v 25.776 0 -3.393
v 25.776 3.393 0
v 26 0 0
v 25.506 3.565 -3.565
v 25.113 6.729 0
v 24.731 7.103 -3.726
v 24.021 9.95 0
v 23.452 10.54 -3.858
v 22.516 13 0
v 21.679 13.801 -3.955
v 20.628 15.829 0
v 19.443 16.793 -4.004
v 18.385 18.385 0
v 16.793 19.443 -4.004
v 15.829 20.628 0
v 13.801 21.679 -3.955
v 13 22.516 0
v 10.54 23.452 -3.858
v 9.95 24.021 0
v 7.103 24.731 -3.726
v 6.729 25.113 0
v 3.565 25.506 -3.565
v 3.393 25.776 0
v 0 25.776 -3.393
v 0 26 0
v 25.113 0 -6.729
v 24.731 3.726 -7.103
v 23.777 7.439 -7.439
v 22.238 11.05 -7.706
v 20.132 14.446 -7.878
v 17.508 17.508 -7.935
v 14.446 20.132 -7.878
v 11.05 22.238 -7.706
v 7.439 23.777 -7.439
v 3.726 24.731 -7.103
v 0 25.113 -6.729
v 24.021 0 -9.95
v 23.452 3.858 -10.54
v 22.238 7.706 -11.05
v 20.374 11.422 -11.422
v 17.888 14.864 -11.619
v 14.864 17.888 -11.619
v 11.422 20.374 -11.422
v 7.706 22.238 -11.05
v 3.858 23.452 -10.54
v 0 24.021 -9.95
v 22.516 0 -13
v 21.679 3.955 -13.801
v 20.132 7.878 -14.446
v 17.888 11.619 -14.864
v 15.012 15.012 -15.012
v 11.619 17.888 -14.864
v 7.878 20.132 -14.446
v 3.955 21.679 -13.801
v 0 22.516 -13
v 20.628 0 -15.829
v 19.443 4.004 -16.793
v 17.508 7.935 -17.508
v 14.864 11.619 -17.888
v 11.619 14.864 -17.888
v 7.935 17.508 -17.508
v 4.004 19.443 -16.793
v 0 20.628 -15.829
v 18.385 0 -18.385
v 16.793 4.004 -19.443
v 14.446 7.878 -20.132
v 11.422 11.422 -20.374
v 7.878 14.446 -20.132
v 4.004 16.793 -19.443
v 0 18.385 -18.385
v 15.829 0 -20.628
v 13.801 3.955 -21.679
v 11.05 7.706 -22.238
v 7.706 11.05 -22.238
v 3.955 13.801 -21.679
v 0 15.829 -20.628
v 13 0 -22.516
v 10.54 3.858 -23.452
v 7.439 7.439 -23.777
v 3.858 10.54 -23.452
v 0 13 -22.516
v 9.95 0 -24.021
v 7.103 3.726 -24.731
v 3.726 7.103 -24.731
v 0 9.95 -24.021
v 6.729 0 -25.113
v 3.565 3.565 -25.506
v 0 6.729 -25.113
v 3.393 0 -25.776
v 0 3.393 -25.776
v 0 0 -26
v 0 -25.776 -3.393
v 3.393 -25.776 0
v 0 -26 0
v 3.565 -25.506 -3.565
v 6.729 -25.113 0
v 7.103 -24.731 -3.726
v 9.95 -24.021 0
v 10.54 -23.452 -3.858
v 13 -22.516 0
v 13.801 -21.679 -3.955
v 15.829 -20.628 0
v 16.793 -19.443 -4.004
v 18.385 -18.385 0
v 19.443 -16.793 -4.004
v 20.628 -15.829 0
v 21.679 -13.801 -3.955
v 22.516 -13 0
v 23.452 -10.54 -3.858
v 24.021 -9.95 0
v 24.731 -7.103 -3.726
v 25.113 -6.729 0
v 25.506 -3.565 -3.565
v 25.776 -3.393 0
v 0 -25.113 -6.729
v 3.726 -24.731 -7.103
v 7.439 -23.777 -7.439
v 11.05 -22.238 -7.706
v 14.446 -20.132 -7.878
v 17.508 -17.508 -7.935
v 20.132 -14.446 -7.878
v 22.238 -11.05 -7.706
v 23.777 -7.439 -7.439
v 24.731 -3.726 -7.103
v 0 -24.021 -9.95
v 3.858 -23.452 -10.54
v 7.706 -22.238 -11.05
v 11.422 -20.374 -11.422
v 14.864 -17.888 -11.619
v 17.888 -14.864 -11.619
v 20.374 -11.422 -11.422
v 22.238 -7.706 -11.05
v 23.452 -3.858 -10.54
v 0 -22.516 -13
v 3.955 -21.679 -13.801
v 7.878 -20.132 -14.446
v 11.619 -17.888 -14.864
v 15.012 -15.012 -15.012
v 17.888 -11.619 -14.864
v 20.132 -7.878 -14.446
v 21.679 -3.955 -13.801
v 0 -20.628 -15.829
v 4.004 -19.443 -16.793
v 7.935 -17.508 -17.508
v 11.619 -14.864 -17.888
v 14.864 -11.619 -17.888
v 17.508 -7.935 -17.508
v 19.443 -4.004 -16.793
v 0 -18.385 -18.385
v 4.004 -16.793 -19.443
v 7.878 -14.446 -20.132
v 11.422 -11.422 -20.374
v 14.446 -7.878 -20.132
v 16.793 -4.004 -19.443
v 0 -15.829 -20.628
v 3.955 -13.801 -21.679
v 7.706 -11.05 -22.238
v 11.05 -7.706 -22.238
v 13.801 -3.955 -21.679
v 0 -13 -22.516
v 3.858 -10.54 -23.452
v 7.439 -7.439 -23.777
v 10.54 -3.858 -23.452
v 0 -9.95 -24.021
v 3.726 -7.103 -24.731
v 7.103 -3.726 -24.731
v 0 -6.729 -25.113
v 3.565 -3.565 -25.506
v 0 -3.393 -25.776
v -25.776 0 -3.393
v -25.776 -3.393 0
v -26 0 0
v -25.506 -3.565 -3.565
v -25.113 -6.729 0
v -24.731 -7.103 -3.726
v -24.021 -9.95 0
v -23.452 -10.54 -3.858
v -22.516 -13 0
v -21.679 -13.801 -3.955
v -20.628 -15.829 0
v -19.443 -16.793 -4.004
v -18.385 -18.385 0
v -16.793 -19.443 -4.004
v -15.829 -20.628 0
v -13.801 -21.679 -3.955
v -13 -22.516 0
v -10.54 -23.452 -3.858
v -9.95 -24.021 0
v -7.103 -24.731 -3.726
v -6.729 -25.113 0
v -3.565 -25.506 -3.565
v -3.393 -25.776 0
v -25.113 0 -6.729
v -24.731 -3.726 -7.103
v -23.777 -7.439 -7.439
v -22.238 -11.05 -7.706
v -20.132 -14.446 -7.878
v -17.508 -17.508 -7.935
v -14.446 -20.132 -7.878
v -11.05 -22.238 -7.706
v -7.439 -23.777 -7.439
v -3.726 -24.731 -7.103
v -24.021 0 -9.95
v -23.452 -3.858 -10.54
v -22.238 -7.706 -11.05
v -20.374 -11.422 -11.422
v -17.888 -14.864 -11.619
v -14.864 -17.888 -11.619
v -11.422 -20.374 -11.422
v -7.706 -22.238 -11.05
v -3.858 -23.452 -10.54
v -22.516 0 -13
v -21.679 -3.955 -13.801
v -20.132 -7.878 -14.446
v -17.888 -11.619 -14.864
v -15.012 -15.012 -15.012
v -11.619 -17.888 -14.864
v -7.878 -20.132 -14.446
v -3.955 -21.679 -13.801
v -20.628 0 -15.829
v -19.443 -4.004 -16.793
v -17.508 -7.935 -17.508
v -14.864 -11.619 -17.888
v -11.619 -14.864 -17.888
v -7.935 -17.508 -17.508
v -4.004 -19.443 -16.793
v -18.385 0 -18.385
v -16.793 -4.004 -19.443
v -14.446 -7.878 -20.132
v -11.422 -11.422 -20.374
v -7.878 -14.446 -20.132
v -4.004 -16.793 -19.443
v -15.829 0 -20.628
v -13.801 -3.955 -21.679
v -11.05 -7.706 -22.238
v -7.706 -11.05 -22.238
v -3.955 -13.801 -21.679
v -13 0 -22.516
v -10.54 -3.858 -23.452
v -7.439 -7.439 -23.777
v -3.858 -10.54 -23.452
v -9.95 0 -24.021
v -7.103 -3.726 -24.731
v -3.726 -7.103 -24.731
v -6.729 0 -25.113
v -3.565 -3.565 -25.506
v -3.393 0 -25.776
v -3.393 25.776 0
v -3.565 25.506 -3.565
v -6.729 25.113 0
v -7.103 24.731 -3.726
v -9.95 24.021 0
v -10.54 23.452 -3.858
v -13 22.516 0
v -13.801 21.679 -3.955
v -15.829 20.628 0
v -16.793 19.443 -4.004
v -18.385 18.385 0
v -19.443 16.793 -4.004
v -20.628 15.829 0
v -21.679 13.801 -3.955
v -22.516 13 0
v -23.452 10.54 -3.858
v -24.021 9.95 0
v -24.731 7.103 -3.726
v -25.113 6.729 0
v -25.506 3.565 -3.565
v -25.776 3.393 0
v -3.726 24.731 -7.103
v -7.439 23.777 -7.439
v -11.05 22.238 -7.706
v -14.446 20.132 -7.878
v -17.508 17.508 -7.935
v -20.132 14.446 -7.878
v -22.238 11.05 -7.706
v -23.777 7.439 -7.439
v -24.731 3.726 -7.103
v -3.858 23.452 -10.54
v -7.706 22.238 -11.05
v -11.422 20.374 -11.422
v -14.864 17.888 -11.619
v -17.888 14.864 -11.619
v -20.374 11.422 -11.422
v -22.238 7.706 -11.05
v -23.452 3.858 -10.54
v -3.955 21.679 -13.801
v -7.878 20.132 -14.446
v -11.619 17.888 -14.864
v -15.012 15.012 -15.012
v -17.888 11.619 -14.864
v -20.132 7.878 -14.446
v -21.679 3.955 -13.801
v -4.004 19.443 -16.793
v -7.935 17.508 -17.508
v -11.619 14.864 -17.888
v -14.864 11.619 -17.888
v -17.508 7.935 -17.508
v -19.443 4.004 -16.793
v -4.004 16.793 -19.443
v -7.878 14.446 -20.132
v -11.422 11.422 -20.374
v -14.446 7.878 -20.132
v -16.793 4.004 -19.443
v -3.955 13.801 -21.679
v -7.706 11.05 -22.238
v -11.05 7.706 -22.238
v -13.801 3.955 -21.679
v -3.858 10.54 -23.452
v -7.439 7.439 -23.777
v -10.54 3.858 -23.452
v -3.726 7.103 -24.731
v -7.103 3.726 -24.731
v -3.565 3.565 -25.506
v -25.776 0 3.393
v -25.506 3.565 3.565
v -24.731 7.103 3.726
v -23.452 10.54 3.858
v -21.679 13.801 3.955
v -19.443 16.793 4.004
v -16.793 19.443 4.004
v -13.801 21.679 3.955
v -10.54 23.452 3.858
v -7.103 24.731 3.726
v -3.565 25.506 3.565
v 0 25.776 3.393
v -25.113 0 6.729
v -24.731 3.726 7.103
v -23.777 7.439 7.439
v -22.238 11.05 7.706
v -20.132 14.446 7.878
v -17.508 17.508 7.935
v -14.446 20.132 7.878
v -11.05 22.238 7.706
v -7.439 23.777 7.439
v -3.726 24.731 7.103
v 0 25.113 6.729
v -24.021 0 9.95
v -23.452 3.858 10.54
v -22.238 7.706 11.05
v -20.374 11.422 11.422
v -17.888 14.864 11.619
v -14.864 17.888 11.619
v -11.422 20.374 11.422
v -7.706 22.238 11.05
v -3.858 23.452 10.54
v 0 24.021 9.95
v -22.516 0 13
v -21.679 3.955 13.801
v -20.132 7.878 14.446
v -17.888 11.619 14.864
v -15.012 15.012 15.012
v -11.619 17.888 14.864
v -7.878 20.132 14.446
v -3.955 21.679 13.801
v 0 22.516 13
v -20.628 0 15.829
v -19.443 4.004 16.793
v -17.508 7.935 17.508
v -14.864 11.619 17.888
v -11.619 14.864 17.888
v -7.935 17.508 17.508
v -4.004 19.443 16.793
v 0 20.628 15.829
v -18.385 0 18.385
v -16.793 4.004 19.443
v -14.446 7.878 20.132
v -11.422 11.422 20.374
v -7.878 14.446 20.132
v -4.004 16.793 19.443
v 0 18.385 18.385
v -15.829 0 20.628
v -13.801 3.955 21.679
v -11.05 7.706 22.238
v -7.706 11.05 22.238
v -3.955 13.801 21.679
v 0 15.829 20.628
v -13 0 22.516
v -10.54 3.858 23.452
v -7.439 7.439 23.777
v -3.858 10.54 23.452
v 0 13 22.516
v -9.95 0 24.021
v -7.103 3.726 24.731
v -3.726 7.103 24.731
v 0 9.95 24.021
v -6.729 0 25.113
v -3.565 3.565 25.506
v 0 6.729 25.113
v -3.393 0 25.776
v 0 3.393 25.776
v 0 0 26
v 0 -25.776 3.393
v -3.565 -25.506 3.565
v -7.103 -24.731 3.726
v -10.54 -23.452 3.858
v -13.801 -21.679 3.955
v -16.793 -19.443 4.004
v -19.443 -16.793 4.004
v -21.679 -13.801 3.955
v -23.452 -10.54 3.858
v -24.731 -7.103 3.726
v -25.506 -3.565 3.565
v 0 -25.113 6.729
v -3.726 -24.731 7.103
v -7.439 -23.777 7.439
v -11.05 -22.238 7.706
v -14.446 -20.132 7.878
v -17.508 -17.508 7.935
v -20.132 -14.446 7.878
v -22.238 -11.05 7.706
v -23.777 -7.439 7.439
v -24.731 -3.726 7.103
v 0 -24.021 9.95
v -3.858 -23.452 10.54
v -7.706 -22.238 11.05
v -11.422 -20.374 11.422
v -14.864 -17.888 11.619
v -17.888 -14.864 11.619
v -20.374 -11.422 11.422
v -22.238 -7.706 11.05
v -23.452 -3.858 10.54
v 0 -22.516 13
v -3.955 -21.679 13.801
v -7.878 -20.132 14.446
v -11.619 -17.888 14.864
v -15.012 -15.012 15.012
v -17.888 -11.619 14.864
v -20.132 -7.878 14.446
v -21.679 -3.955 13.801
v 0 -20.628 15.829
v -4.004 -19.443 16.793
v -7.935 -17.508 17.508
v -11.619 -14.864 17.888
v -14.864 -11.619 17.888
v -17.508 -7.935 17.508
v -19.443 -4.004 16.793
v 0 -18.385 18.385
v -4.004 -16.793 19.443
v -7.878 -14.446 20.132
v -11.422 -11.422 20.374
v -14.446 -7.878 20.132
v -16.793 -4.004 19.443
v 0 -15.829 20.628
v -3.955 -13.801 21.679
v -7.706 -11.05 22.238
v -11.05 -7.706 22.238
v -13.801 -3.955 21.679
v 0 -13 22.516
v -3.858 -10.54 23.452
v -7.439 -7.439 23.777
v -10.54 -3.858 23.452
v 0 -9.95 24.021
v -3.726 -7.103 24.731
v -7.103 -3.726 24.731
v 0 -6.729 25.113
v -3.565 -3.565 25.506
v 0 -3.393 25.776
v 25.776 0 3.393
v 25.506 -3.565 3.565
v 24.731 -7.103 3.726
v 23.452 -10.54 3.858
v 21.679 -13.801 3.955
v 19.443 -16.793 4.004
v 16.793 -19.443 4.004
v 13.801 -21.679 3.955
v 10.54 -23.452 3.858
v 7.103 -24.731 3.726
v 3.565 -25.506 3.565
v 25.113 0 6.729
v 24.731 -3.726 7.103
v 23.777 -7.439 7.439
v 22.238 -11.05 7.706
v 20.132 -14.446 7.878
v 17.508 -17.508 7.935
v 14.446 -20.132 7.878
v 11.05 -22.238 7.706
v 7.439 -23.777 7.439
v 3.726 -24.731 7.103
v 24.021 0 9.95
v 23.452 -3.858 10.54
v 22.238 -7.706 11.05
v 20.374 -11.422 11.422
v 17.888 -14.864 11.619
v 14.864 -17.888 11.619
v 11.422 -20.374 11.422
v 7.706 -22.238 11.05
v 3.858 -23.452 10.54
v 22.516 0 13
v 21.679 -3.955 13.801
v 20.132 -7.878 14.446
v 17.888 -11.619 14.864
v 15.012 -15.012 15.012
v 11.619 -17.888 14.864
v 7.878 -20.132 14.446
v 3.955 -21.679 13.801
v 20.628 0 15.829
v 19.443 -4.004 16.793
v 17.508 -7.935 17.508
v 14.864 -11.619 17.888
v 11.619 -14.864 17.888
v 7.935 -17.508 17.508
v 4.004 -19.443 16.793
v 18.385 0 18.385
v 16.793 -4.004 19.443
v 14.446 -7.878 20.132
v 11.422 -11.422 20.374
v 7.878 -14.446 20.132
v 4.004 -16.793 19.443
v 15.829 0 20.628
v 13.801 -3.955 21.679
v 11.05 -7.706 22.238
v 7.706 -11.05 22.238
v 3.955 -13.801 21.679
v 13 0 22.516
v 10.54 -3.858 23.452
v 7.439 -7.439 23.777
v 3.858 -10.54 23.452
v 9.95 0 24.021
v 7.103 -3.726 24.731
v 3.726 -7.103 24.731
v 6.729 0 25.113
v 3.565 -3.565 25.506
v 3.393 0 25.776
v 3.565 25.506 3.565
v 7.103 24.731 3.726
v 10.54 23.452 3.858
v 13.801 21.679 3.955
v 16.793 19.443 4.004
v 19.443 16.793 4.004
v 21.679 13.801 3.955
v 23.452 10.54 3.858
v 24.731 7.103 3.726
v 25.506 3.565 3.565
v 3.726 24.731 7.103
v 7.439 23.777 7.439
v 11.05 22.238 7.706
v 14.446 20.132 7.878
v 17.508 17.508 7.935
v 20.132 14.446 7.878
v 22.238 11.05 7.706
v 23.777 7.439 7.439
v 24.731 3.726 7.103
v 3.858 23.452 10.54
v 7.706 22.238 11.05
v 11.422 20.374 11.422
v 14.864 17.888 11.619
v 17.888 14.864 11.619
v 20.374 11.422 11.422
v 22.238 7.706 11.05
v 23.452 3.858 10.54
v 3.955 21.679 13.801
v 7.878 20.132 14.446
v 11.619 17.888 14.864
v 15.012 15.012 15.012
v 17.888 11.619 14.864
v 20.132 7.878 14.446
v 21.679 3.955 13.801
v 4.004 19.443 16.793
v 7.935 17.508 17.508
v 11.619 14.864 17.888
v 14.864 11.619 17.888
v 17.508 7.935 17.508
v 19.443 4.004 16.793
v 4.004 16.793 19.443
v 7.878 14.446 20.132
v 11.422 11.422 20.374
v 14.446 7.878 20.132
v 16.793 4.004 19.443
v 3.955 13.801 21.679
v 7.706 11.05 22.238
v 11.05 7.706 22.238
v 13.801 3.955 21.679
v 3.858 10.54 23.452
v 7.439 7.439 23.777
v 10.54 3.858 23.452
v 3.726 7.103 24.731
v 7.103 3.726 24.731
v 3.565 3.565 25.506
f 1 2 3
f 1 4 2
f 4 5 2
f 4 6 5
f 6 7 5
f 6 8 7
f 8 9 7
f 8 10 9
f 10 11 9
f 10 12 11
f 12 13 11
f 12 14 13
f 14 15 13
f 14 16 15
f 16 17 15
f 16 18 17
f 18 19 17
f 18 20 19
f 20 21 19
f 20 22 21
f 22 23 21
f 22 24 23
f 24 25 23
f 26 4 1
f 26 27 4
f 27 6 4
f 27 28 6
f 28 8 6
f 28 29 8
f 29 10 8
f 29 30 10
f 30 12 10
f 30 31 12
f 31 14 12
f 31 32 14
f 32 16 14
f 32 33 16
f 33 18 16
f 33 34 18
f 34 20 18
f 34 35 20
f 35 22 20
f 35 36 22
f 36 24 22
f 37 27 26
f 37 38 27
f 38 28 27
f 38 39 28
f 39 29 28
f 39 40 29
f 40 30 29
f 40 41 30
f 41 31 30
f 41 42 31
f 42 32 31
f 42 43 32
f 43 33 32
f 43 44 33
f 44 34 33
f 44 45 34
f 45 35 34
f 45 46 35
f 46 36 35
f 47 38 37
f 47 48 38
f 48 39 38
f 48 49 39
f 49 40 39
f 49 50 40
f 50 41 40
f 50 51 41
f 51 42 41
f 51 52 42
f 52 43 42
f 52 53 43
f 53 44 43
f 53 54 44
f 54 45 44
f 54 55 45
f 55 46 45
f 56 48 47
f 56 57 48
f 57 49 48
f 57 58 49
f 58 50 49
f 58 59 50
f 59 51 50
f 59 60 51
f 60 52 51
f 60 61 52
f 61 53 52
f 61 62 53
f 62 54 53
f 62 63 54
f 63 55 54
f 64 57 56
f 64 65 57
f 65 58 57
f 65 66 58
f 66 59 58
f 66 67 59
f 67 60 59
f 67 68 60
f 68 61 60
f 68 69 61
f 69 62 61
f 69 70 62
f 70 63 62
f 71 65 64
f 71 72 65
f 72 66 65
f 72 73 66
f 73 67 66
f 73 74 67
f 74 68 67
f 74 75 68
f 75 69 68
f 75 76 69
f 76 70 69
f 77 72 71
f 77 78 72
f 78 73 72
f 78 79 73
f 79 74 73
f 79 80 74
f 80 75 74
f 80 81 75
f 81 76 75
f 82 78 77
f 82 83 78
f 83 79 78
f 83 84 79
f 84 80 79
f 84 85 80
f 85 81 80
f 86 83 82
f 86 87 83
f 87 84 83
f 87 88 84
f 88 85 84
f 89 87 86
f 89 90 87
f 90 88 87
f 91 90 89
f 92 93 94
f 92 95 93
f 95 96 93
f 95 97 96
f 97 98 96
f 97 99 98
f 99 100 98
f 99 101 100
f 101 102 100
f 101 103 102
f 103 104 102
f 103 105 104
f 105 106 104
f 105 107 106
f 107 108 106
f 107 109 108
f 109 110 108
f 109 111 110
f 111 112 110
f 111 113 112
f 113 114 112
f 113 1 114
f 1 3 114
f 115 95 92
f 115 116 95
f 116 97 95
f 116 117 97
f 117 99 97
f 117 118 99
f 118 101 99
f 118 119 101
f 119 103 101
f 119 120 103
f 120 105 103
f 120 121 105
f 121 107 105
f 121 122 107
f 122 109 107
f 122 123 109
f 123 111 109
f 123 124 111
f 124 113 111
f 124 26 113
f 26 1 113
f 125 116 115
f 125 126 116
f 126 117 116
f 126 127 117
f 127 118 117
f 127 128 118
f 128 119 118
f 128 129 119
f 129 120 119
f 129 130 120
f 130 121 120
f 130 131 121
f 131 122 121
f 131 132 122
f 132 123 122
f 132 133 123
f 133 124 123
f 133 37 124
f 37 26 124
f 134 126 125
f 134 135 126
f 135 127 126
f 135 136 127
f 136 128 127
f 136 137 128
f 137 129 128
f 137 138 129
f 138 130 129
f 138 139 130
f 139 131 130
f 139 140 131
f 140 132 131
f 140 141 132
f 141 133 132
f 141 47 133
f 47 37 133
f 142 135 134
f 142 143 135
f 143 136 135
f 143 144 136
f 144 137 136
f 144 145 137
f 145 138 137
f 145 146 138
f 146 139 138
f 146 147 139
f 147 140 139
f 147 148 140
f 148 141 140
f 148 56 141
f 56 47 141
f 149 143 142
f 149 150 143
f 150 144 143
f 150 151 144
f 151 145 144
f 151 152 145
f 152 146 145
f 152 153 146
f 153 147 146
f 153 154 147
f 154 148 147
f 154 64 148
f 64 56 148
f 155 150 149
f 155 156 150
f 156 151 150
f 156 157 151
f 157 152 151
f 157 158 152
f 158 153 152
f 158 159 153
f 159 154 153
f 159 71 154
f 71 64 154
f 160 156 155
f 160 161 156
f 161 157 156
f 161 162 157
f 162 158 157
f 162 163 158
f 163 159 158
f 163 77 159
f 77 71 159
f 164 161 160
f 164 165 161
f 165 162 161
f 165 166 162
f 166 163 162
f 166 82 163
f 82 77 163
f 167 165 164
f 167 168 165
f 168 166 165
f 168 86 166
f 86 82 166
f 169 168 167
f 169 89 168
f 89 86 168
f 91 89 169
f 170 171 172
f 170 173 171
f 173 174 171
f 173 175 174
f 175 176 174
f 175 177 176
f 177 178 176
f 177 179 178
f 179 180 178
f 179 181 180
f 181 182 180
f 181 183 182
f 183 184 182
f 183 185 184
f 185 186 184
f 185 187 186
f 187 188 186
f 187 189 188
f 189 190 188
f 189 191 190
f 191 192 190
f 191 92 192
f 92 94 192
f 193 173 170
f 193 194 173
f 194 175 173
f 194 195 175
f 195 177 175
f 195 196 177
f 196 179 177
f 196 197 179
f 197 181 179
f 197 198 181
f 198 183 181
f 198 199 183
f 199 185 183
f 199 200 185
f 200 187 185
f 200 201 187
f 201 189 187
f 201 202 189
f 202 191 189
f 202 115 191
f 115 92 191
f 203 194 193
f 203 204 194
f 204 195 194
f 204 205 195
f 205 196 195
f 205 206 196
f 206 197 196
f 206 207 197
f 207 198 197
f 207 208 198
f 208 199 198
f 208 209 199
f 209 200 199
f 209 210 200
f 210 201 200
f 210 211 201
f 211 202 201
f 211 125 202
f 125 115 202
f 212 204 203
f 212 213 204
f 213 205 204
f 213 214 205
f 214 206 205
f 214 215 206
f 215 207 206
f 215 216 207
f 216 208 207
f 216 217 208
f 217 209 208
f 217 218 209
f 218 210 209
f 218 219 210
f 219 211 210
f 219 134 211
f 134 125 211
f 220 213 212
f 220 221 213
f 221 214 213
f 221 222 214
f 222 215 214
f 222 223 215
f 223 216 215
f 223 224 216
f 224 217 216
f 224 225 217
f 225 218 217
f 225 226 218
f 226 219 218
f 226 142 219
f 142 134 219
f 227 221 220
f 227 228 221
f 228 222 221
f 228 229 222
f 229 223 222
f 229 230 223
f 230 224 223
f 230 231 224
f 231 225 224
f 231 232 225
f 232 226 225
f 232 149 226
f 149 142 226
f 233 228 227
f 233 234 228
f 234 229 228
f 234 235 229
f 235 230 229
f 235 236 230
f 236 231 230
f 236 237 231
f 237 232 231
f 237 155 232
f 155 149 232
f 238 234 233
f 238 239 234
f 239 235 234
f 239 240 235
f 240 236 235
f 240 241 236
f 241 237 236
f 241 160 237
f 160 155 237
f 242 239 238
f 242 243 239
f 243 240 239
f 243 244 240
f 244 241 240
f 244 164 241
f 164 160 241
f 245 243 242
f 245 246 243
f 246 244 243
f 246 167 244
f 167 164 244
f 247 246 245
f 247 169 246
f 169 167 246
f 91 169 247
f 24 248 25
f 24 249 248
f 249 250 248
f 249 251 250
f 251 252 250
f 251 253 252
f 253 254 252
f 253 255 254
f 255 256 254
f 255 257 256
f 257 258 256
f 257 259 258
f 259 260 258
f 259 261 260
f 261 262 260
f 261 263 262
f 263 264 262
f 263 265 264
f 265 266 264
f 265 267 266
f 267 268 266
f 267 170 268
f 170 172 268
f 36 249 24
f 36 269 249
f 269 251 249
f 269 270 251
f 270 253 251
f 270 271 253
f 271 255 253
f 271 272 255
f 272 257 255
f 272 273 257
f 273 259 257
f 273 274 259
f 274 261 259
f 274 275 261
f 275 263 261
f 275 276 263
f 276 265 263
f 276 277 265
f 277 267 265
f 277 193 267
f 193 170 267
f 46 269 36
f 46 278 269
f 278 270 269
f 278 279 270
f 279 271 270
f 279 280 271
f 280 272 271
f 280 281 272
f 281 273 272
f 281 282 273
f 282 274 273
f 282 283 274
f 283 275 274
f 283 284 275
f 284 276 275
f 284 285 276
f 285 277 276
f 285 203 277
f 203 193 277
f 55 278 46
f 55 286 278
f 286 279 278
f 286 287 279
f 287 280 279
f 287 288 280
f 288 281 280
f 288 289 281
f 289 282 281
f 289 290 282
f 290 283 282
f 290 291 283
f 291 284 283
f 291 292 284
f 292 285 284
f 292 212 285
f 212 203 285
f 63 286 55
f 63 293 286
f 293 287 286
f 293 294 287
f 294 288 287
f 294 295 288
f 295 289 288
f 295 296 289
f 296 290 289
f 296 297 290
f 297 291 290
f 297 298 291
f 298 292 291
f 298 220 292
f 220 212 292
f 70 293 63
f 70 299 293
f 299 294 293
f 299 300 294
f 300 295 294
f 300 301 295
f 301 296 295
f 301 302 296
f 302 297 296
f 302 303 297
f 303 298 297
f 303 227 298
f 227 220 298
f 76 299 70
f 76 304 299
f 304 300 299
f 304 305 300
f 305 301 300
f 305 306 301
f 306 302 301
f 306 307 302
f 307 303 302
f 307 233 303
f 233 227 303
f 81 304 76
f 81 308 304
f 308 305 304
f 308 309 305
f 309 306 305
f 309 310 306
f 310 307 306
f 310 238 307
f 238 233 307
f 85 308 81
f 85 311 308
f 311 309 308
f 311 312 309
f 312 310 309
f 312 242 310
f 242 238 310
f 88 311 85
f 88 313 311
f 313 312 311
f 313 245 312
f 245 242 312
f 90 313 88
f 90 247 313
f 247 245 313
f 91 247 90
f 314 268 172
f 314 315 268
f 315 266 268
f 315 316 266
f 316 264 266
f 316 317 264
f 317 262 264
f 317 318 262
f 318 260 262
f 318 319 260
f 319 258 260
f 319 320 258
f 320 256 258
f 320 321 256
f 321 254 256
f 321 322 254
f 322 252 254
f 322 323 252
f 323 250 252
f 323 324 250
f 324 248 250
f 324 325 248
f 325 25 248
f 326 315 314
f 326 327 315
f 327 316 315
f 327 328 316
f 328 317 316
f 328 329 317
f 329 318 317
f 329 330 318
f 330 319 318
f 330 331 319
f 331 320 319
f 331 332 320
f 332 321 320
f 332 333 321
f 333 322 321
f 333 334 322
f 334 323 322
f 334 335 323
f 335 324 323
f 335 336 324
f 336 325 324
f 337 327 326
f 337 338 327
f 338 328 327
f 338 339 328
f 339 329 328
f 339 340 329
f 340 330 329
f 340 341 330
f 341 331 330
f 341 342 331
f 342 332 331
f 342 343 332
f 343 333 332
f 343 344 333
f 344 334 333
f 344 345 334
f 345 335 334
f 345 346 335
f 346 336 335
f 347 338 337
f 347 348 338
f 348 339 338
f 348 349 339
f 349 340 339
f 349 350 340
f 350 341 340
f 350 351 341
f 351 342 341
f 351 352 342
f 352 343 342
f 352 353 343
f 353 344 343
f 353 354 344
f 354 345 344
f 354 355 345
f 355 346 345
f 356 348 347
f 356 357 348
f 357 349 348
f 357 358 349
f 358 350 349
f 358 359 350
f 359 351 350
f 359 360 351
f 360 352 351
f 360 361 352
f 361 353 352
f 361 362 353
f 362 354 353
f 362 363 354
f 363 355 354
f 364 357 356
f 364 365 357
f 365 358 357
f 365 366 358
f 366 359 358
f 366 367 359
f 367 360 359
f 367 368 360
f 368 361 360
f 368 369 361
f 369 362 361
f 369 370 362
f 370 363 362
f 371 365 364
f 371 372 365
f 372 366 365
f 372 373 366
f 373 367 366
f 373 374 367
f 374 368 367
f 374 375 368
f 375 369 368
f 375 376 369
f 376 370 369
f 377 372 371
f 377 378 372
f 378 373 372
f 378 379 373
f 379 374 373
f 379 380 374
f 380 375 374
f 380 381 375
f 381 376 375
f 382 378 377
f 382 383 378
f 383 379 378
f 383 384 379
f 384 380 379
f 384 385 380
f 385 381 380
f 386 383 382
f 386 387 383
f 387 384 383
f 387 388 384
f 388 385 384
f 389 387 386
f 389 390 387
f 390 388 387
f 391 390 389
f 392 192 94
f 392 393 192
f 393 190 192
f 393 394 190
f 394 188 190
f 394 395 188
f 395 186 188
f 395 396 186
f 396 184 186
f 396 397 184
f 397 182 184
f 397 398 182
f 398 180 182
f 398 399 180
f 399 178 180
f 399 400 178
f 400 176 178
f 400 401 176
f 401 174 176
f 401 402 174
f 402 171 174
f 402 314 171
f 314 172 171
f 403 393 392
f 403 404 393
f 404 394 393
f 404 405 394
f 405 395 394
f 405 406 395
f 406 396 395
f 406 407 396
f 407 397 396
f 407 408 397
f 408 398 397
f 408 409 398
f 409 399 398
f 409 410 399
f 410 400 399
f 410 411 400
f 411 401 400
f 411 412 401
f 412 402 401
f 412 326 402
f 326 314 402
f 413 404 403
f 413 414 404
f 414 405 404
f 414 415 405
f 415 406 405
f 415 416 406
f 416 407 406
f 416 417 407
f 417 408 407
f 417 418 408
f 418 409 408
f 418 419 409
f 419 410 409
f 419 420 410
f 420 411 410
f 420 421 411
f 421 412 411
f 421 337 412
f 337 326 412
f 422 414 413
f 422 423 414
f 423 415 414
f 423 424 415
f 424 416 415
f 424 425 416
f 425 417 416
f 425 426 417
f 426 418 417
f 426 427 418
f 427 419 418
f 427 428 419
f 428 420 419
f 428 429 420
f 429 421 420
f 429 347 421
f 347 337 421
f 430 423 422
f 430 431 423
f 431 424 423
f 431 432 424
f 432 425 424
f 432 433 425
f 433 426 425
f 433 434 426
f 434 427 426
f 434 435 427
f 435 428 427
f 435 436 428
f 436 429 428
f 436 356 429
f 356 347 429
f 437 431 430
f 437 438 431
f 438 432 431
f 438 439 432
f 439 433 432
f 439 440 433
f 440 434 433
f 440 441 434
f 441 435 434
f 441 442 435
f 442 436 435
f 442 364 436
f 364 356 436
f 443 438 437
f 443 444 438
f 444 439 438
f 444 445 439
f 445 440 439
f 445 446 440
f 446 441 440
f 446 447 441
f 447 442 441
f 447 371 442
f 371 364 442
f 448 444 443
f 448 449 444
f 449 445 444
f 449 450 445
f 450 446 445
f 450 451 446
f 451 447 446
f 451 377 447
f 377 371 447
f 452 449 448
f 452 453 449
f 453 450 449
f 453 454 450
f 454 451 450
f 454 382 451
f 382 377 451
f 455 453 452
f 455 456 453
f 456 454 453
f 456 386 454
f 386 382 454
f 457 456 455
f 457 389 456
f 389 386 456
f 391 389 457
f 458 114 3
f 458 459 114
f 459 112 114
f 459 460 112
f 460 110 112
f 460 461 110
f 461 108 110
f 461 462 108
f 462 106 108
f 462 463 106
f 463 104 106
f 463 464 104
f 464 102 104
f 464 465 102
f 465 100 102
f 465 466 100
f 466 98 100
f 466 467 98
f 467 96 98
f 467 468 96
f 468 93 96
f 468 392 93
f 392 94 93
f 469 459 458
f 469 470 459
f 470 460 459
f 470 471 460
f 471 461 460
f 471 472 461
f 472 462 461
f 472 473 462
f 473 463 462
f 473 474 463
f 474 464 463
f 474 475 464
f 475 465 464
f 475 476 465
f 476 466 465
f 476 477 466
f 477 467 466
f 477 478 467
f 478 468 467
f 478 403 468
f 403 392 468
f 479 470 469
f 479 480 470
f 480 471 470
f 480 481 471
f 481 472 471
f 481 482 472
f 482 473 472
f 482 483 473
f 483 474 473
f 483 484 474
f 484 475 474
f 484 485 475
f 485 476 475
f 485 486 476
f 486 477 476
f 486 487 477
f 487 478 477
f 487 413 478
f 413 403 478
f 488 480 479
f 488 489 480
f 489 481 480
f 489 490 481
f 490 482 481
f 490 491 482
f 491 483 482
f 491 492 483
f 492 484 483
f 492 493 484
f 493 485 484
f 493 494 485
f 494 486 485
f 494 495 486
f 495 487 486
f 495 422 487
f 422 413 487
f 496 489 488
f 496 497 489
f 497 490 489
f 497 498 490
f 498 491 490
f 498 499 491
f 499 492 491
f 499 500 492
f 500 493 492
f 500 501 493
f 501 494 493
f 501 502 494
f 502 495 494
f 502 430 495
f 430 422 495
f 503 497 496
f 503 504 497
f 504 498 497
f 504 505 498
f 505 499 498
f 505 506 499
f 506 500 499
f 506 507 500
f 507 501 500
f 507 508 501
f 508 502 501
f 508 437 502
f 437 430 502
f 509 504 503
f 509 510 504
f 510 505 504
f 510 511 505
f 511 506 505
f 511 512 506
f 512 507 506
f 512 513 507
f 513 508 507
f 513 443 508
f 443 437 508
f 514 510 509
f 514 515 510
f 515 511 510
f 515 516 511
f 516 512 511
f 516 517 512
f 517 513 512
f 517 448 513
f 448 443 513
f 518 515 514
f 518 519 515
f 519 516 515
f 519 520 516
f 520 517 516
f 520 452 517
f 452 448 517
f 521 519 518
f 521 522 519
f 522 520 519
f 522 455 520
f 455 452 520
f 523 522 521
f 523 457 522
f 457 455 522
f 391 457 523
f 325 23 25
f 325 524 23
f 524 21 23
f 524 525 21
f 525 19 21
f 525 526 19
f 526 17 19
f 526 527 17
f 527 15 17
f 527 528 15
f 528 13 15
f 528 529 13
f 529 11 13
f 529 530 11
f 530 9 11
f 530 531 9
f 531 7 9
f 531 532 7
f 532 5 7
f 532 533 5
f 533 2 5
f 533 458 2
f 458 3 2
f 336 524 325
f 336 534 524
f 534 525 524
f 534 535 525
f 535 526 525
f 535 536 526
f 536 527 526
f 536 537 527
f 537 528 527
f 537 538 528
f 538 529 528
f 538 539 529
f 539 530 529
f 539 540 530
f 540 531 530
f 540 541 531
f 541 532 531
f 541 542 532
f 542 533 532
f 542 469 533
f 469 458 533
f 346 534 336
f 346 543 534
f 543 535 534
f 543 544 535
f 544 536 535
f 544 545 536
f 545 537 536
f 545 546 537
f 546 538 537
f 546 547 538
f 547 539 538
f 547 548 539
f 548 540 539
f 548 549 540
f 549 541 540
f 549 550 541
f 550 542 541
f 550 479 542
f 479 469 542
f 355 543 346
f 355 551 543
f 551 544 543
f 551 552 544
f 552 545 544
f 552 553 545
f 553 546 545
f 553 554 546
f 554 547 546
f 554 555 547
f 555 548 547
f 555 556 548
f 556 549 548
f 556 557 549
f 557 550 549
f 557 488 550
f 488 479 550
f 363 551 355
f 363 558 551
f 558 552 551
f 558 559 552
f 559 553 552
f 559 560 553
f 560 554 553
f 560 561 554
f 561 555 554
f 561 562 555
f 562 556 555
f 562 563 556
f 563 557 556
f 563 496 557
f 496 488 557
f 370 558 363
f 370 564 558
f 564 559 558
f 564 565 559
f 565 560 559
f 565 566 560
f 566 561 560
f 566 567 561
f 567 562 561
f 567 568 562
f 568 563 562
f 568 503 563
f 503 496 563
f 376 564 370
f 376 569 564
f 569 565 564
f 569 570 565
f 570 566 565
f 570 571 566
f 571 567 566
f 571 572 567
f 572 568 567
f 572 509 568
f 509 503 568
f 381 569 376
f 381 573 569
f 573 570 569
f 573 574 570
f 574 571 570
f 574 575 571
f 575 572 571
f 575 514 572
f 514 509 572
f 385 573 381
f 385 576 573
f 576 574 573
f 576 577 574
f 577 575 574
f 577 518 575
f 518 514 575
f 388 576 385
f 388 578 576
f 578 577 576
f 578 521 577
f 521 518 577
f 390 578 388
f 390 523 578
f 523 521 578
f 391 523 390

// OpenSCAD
// file: ../p/48/8-8sphe.scad
use <../../lib.scad>
use <1-8sphe.scad>
function ldraw_lib__48__8_8sphe() = [
// 0 Hi-Res Sphere 1.0
// 0 Name: 48\8-8sphe.dat
// 0 Author: Steve Bliss [sbliss]
// 0 !LDRAW_ORG 48_Primitive UPDATE 2012-01
// 0 !LICENSE Licensed under CC BY 2.0 and CC BY 4.0 : see CAreadme.txt
// 
// 0 BFC CERTIFY CCW
  [0,"BFC","CERTIFY"],
  [0,"BFC","CCW"],
// 
// 0 !HISTORY 2012-03-30 [PTadmin] Official Update 2012-01
// 
// 
// 1 16 0 0 0 1 0 0 0 1 0 0 0 1 48\1-8sphe.dat
  [1,16,0,0,0,1,0,0,0,1,0,0,0,1, ldraw_lib__48__1_8sphe()],
// 1 16 0 0 0 0 0 1 0 1 0 -1 0 0 48\1-8sphe.dat
  [1,16,0,0,0,0,0,1,0,1,0,-1,0,0, ldraw_lib__48__1_8sphe()],
// 1 16 0 0 0 -1 0 0 0 1 0 0 0 -1 48\1-8sphe.dat
  [1,16,0,0,0,-1,0,0,0,1,0,0,0,-1, ldraw_lib__48__1_8sphe()],
// 1 16 0 0 0 0 0 -1 0 1 0 1 0 0 48\1-8sphe.dat
  [1,16,0,0,0,0,0,-1,0,1,0,1,0,0, ldraw_lib__48__1_8sphe()],
// 1 16 0 0 0 -1 0 0 0 -1 0 0 0 1 48\1-8sphe.dat
  [1,16,0,0,0,-1,0,0,0,-1,0,0,0,1, ldraw_lib__48__1_8sphe()],
// 1 16 0 0 0 0 0 -1 0 -1 0 -1 0 0 48\1-8sphe.dat
  [1,16,0,0,0,0,0,-1,0,-1,0,-1,0,0, ldraw_lib__48__1_8sphe()],
// 1 16 0 0 0 1 0 0 0 -1 0 0 0 -1 48\1-8sphe.dat
  [1,16,0,0,0,1,0,0,0,-1,0,0,0,-1, ldraw_lib__48__1_8sphe()],
// 1 16 0 0 0 0 0 1 0 -1 0 1 0 0 48\1-8sphe.dat
  [1,16,0,0,0,0,0,1,0,-1,0,1,0,0, ldraw_lib__48__1_8sphe()],
// 0
];
makepoly(ldraw_lib__48__8_8sphe(), line=0.2);
// file: 22119.scad
use <../lib.scad>
use <../p/48/8-8sphe.scad>
function ldraw_lib__22119() = [
// 0 Ball 52mm Diameter
// 0 Name: 22119.dat
// 0 Author: Philippe Hurbain [Philo]
// 0 !LDRAW_ORG Part UPDATE 2012-01
// 0 !LICENSE Licensed under CC BY 2.0 and CC BY 4.0 : see CAreadme.txt
// 
// 0 BFC CERTIFY CCW
  [0,"BFC","CERTIFY"],
  [0,"BFC","CCW"],
// 
// 0 !CATEGORY Sphere
// 
// 0 !HISTORY 2012-03-30 [PTadmin] Official Update 2012-01
// 
// 
// 1 16 0 0 0 65 0 0 0 65 0 0 0 65 48\8-8sphe.dat
  [1,16,0,0,0,65,0,0,0,65,0,0,0,65, ldraw_lib__48__8_8sphe()],
// 0
];
makepoly(ldraw_lib__22119(), line=0.2);
// main file
use <../lib.scad>
use <22119.scad>
function ldraw_lib__40000() = [
// 0 ~_Ball 52mm Diameter Yellow (Obsolete)
// 0 Name: 40000.dat
// 0 Author: [PTadmin]
// 0 !LDRAW_ORG Part Physical_Colour UPDATE 2019-02
// 0 !LICENSE Licensed under CC BY 2.0 and CC BY 4.0 : see CAreadme.txt
// 
// 0 BFC CERTIFY CCW
  [0,"BFC","CERTIFY"],
  [0,"BFC","CCW"],
// 
// 0 !CATEGORY Sphere
// 
// 0 !HISTORY 2012-03-30 [PTadmin] Official Update 2012-01
// 0 !HISTORY 2019-07-24 [Holly-Wood] Obsoleted per decision not to include physical colour parts
// 0 !HISTORY 2019-09-09 [PTadmin] Official Update 2019-02
// 
// 
// 0 // This file is a "shortcut" with the correct number for the actual
// 0 // colouring of the part (Yellow).
// 
// 1 14 0 0 0 1 0 0 0 1 0 0 0 1 22119.dat
  [1,14,0,0,0,1,0,0,0,1,0,0,0,1, ldraw_lib__22119()],
];
makepoly(ldraw_lib__40000(), line=0.2);
